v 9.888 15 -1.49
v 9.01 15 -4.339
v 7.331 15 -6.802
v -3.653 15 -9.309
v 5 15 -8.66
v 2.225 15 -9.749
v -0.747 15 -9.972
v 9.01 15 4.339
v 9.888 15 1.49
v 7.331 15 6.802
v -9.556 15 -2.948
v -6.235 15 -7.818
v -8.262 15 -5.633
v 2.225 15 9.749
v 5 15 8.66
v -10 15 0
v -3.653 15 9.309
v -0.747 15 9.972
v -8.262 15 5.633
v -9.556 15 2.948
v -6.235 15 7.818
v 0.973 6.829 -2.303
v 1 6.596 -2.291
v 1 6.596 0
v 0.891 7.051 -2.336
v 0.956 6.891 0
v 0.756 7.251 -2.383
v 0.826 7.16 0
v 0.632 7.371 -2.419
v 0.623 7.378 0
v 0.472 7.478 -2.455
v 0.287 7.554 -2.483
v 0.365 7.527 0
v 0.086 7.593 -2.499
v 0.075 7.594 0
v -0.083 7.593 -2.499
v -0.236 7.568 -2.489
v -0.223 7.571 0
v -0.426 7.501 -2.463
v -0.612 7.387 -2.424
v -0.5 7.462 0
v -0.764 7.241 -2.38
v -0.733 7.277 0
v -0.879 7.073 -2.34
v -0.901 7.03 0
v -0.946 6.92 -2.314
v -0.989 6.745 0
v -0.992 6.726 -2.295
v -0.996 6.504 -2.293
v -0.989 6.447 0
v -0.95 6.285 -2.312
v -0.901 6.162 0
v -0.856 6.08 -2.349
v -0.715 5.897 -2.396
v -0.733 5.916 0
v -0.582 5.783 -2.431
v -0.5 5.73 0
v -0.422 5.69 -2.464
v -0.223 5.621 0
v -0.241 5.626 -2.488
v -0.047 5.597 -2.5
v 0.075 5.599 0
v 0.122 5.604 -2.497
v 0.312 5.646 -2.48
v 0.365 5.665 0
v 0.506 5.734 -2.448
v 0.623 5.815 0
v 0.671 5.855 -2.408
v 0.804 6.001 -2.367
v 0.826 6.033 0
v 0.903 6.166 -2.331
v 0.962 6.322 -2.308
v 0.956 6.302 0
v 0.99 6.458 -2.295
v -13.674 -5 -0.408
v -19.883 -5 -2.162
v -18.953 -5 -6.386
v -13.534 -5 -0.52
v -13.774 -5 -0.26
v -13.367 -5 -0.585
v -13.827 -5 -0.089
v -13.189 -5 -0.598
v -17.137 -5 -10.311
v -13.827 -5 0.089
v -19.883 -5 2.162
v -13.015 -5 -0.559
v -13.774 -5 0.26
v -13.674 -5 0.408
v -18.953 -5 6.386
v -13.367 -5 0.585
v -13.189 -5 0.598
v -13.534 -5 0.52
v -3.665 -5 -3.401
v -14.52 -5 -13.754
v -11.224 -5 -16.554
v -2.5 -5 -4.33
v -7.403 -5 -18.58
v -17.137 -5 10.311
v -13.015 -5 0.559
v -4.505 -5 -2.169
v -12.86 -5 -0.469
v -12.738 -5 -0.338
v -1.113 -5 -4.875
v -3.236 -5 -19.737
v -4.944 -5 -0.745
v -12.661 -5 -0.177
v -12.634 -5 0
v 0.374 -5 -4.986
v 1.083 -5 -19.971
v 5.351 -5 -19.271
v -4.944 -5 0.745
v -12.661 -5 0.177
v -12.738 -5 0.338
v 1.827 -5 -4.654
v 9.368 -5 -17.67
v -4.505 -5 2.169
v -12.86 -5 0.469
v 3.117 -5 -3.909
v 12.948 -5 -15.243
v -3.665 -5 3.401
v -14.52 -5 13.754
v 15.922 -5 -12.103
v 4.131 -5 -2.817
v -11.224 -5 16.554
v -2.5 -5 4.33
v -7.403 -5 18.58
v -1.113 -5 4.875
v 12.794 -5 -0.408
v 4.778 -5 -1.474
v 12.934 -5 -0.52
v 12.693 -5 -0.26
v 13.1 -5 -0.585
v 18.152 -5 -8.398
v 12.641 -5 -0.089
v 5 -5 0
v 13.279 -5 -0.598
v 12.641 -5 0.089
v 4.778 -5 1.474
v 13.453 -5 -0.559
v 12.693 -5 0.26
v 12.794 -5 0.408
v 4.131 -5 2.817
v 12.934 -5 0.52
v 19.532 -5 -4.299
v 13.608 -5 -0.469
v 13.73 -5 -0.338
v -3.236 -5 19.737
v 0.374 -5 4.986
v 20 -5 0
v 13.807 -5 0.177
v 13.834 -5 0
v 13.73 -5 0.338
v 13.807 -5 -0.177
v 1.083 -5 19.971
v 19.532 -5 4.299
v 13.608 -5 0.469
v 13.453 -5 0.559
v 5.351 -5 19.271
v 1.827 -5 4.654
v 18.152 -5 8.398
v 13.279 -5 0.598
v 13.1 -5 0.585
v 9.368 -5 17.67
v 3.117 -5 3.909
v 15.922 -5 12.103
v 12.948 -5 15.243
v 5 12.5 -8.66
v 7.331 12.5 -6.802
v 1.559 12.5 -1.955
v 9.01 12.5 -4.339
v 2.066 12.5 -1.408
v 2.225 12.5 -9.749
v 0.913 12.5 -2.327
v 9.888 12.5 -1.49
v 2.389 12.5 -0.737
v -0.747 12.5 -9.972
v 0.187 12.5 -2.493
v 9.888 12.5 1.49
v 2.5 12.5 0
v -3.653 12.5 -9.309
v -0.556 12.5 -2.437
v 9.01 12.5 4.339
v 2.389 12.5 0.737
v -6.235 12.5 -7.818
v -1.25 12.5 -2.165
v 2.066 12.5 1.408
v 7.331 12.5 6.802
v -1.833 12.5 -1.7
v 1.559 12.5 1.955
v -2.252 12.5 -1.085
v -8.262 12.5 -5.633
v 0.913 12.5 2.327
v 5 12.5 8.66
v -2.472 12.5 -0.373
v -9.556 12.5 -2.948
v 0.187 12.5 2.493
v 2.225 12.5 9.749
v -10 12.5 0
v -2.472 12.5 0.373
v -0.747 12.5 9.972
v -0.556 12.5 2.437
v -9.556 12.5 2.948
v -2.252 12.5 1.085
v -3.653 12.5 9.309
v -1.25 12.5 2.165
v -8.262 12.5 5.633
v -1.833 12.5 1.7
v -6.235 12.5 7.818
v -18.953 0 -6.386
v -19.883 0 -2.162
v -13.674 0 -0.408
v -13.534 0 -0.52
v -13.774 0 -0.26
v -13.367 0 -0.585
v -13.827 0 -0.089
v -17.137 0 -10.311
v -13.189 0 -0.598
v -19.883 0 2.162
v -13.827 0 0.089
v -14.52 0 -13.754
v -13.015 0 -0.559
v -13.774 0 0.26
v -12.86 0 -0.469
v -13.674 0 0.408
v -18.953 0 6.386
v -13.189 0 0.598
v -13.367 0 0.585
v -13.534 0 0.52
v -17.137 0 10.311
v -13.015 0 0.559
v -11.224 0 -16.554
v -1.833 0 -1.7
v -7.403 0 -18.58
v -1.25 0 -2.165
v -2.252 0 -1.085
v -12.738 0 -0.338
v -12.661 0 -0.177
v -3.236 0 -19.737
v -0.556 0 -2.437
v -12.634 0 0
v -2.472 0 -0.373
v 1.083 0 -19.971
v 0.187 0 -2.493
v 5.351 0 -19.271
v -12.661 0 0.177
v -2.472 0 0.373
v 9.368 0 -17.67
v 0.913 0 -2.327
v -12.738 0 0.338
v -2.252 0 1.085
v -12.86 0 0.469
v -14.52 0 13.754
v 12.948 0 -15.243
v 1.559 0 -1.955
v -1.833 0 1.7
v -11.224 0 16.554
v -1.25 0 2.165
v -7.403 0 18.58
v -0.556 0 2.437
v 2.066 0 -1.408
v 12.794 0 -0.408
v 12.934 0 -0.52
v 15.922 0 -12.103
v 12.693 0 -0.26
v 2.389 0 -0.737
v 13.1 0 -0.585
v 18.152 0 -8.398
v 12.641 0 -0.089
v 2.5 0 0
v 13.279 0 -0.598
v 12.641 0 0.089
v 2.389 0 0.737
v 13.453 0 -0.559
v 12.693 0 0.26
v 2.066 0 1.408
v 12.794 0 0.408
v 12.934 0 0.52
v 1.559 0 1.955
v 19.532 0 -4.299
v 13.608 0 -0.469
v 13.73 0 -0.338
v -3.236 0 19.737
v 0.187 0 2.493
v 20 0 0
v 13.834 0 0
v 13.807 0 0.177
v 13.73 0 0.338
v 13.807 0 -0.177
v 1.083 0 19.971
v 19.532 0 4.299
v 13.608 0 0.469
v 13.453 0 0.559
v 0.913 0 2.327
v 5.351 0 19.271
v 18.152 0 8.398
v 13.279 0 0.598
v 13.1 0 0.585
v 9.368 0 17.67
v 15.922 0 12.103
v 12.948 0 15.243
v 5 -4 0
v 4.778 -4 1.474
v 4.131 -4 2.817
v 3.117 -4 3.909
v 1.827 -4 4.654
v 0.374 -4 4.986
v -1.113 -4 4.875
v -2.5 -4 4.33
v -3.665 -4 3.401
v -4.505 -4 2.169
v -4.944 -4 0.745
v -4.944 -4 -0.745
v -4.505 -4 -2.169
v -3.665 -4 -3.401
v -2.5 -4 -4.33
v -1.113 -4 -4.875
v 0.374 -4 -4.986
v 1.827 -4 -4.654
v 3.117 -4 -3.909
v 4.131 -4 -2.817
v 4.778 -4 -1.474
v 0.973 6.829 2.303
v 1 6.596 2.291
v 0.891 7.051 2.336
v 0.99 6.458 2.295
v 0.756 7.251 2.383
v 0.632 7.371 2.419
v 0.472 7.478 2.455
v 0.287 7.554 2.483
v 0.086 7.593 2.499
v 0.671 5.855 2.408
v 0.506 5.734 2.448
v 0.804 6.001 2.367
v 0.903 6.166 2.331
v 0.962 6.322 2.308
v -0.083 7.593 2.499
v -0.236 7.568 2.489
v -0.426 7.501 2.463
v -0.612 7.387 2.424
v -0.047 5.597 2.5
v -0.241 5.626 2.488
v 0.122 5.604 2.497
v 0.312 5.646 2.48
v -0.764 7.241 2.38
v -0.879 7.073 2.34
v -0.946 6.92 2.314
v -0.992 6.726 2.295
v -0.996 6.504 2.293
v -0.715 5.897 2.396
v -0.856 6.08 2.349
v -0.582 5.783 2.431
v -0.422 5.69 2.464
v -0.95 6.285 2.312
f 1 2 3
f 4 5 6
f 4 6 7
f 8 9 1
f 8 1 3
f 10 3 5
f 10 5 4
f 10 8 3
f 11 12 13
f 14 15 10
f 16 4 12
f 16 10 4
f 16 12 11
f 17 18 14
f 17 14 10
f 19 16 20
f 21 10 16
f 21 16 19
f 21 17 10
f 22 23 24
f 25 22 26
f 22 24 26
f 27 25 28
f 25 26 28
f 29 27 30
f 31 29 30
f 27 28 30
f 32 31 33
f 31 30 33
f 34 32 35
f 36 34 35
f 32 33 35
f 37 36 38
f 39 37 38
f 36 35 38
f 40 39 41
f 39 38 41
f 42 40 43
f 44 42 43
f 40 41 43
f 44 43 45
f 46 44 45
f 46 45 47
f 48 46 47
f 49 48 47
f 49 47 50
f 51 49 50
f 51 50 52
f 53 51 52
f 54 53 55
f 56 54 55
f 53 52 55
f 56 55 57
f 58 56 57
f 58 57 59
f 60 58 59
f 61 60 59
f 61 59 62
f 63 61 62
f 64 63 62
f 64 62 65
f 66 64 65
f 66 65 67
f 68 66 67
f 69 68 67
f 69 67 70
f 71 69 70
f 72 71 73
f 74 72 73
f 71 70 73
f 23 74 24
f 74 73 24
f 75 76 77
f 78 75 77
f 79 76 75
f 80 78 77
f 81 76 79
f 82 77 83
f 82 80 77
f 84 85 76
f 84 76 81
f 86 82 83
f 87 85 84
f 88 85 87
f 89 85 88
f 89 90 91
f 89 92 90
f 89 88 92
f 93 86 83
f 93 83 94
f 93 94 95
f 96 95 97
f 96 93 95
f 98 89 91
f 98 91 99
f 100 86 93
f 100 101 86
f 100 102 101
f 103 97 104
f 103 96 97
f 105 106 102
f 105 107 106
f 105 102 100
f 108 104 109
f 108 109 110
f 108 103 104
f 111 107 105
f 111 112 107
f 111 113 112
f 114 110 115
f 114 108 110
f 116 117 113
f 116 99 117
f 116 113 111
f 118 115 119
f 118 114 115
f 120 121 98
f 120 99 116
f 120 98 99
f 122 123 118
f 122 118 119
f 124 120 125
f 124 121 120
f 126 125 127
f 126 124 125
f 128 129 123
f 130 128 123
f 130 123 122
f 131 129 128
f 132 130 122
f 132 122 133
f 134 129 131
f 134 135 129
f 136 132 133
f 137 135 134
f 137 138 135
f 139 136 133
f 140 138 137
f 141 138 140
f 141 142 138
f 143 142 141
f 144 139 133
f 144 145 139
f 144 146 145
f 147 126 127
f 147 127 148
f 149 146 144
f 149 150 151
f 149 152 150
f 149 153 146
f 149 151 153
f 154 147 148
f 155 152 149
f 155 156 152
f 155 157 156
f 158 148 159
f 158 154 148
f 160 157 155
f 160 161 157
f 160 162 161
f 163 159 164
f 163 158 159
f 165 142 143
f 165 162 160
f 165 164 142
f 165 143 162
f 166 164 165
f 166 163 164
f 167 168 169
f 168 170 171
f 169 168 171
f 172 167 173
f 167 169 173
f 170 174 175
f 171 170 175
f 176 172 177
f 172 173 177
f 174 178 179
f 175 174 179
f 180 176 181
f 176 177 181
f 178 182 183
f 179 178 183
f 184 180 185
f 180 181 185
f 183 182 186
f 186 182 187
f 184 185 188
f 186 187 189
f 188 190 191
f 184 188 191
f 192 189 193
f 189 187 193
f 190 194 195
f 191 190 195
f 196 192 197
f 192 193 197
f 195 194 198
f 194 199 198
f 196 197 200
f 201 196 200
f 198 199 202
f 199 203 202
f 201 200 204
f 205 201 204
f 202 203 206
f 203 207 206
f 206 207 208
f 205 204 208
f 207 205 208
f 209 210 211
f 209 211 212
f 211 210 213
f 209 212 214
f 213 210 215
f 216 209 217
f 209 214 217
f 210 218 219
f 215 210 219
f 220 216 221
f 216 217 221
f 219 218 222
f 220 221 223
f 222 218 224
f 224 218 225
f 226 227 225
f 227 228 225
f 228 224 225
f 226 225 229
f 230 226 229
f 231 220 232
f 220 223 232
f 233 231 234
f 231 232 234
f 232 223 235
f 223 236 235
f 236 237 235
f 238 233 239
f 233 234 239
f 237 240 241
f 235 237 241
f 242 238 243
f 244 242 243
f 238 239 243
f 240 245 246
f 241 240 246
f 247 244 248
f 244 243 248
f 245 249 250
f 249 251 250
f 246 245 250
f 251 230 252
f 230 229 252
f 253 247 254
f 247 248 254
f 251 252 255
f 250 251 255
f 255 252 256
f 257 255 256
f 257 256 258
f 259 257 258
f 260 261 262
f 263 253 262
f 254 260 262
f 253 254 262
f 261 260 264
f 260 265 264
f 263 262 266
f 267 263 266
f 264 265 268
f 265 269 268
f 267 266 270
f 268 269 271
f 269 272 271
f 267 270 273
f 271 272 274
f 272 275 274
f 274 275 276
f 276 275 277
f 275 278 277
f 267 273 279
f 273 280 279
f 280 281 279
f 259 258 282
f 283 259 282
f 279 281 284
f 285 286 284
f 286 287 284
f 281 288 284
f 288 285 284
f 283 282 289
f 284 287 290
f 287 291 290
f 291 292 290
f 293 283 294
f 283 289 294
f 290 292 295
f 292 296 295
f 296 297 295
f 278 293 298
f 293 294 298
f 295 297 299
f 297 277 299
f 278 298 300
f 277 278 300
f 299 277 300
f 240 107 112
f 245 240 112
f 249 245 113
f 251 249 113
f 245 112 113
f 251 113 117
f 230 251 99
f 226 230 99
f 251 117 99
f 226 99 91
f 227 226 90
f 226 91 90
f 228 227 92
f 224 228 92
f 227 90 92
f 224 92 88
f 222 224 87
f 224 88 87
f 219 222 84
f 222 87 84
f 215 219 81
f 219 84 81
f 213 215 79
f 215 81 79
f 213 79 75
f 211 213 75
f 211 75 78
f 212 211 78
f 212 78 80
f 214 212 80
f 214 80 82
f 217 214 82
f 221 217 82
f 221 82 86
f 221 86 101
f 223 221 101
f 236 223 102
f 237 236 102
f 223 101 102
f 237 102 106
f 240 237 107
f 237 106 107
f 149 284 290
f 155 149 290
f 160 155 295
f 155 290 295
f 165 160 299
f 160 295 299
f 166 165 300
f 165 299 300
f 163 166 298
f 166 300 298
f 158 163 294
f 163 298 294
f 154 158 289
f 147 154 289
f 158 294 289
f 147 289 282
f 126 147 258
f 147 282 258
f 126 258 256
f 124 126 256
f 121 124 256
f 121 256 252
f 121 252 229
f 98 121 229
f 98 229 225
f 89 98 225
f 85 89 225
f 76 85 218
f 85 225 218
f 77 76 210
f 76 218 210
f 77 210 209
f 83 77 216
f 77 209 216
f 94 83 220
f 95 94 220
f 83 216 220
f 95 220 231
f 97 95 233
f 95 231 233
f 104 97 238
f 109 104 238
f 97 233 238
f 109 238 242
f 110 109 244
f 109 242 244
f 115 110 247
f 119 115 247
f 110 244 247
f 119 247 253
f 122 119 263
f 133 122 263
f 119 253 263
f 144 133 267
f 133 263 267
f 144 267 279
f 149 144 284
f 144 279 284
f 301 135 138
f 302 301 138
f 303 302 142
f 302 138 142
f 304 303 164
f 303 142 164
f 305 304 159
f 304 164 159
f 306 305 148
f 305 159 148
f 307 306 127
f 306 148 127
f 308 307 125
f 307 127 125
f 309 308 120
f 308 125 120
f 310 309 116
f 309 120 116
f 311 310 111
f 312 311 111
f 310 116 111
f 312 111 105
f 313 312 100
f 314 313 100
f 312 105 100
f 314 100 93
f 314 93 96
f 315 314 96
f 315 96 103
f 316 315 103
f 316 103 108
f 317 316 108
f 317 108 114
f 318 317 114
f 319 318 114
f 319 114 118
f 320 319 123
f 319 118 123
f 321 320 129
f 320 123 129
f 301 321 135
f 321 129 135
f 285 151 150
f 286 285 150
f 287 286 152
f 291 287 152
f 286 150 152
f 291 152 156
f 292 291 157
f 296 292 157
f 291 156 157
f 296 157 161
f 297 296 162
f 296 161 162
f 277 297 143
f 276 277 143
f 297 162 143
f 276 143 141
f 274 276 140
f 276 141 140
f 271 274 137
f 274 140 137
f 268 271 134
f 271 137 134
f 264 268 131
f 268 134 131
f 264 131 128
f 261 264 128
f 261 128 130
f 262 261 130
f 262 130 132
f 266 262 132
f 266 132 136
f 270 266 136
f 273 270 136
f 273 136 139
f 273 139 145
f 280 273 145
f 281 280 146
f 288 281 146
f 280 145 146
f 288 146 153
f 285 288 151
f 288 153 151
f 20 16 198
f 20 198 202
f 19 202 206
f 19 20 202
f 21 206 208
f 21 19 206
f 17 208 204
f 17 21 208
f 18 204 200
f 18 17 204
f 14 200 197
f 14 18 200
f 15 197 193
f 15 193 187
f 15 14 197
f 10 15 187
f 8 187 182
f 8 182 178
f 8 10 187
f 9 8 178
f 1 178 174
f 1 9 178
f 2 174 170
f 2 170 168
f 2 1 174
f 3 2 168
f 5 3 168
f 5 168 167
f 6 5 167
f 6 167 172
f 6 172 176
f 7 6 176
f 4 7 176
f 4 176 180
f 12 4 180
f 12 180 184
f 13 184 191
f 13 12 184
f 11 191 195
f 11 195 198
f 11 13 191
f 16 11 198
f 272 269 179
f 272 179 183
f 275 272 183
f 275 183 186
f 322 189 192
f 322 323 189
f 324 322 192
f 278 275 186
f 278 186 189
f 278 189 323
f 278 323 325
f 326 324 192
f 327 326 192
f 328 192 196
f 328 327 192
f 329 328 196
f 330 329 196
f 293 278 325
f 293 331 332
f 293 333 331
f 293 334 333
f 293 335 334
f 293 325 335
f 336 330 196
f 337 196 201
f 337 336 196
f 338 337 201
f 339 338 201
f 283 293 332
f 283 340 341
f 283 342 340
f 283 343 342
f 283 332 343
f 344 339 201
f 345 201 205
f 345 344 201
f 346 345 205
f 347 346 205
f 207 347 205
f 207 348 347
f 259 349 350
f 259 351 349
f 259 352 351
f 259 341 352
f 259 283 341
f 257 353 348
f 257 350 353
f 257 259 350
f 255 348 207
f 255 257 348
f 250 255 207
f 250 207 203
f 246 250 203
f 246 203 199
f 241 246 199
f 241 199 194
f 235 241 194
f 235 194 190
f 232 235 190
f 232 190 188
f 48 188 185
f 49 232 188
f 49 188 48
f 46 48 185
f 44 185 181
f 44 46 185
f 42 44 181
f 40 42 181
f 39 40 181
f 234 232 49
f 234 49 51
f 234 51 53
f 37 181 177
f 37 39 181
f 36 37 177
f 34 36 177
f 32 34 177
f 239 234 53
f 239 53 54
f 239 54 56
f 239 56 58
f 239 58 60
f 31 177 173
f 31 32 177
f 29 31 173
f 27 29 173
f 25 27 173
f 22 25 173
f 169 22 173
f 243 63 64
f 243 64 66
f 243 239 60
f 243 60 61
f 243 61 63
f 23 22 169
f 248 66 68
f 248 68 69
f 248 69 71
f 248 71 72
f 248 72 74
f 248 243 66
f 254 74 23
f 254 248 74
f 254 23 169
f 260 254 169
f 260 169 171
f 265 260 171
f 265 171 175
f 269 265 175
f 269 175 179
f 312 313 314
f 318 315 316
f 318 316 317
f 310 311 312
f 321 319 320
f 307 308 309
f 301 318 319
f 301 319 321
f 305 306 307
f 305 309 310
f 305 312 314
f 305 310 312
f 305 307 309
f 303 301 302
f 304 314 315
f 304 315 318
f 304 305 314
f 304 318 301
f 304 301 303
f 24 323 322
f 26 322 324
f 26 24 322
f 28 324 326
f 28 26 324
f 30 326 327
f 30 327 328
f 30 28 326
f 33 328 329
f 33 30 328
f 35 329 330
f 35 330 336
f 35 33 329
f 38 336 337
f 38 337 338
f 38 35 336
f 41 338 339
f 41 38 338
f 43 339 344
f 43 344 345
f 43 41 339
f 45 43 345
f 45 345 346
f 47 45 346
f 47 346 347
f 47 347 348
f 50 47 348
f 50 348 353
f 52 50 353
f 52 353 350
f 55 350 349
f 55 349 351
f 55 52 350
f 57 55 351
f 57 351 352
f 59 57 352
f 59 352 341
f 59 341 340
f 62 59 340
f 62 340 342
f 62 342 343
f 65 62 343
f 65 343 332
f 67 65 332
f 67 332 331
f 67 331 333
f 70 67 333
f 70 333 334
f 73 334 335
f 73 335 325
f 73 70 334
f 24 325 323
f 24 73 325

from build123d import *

# Parameters (mm, degrees)
F0_R          = 20
F1_DEPTH      = 5
F2_R          = 0.6
F3_DEPTH      = 5
F4_R          = 2.5
F5_DEPTH      = 15
F6_R          = 1
F7_DEPTH      = 25
F7_DEPTH_BACK = 25
F9_DEPTH      = 25
F9_DEPTH_BACK = 25
F8_R          = 5
F10_DEPTH     = 1
F11_R         = 10
F12_DEPTH     = 2.5


# Not quite as in the source:
# - a feature names something its author has since deleted; it is built from what else it names


with BuildPart() as f1:
    # F0 (on Front) → F1 (new body)
    with BuildSketch(Plane.XZ):
        Circle(F0_R)
    extrude(amount=F1_DEPTH)

    # F2 (on face) → F3 (cut, through all)
    with BuildSketch(Plane.XZ.offset(5)):
        with Locations((-13.23387, 0)):
            Circle(F2_R)
        with Locations((13.23387, 0)):
            Circle(F2_R)
    extrude(amount=-F3_DEPTH, mode=Mode.SUBTRACT)

    # F4 (on face) → F5 (join)
    with BuildSketch(Plane.XZ):
        Circle(F4_R)
    extrude(amount=-F5_DEPTH)

    # F6 (on Top) → F7 (cut, two sides)
    with BuildSketch(Plane.XY) as f7_sk:
        with Locations((0, 6.5963385438)):
            Circle(F6_R)
    extrude(amount=F7_DEPTH, mode=Mode.SUBTRACT)
    extrude(f7_sk.sketch, amount=-F7_DEPTH_BACK, mode=Mode.SUBTRACT)

    # F6 (on Top) → F9 (cut, two sides)
    with BuildSketch(Plane.XY) as f9_sk:
        with Locations((0, 6.5963385438)):
            Circle(F6_R)
    extrude(amount=-F9_DEPTH, mode=Mode.SUBTRACT)
    extrude(f9_sk.sketch, amount=F9_DEPTH_BACK, mode=Mode.SUBTRACT)

    # F8 (on face) → F10 (cut)
    with BuildSketch(Plane.XZ.offset(5)):
        Circle(F8_R)
    extrude(amount=-F10_DEPTH, mode=Mode.SUBTRACT)

    # F11 (on face) → F12 (join)
    with BuildSketch(Plane(origin=(0, 15, 0), x_dir=(-1, 0, 0), z_dir=(0, 1, 0))):
        Circle(F11_R)
    extrude(amount=-F12_DEPTH)


solid = f1.part
